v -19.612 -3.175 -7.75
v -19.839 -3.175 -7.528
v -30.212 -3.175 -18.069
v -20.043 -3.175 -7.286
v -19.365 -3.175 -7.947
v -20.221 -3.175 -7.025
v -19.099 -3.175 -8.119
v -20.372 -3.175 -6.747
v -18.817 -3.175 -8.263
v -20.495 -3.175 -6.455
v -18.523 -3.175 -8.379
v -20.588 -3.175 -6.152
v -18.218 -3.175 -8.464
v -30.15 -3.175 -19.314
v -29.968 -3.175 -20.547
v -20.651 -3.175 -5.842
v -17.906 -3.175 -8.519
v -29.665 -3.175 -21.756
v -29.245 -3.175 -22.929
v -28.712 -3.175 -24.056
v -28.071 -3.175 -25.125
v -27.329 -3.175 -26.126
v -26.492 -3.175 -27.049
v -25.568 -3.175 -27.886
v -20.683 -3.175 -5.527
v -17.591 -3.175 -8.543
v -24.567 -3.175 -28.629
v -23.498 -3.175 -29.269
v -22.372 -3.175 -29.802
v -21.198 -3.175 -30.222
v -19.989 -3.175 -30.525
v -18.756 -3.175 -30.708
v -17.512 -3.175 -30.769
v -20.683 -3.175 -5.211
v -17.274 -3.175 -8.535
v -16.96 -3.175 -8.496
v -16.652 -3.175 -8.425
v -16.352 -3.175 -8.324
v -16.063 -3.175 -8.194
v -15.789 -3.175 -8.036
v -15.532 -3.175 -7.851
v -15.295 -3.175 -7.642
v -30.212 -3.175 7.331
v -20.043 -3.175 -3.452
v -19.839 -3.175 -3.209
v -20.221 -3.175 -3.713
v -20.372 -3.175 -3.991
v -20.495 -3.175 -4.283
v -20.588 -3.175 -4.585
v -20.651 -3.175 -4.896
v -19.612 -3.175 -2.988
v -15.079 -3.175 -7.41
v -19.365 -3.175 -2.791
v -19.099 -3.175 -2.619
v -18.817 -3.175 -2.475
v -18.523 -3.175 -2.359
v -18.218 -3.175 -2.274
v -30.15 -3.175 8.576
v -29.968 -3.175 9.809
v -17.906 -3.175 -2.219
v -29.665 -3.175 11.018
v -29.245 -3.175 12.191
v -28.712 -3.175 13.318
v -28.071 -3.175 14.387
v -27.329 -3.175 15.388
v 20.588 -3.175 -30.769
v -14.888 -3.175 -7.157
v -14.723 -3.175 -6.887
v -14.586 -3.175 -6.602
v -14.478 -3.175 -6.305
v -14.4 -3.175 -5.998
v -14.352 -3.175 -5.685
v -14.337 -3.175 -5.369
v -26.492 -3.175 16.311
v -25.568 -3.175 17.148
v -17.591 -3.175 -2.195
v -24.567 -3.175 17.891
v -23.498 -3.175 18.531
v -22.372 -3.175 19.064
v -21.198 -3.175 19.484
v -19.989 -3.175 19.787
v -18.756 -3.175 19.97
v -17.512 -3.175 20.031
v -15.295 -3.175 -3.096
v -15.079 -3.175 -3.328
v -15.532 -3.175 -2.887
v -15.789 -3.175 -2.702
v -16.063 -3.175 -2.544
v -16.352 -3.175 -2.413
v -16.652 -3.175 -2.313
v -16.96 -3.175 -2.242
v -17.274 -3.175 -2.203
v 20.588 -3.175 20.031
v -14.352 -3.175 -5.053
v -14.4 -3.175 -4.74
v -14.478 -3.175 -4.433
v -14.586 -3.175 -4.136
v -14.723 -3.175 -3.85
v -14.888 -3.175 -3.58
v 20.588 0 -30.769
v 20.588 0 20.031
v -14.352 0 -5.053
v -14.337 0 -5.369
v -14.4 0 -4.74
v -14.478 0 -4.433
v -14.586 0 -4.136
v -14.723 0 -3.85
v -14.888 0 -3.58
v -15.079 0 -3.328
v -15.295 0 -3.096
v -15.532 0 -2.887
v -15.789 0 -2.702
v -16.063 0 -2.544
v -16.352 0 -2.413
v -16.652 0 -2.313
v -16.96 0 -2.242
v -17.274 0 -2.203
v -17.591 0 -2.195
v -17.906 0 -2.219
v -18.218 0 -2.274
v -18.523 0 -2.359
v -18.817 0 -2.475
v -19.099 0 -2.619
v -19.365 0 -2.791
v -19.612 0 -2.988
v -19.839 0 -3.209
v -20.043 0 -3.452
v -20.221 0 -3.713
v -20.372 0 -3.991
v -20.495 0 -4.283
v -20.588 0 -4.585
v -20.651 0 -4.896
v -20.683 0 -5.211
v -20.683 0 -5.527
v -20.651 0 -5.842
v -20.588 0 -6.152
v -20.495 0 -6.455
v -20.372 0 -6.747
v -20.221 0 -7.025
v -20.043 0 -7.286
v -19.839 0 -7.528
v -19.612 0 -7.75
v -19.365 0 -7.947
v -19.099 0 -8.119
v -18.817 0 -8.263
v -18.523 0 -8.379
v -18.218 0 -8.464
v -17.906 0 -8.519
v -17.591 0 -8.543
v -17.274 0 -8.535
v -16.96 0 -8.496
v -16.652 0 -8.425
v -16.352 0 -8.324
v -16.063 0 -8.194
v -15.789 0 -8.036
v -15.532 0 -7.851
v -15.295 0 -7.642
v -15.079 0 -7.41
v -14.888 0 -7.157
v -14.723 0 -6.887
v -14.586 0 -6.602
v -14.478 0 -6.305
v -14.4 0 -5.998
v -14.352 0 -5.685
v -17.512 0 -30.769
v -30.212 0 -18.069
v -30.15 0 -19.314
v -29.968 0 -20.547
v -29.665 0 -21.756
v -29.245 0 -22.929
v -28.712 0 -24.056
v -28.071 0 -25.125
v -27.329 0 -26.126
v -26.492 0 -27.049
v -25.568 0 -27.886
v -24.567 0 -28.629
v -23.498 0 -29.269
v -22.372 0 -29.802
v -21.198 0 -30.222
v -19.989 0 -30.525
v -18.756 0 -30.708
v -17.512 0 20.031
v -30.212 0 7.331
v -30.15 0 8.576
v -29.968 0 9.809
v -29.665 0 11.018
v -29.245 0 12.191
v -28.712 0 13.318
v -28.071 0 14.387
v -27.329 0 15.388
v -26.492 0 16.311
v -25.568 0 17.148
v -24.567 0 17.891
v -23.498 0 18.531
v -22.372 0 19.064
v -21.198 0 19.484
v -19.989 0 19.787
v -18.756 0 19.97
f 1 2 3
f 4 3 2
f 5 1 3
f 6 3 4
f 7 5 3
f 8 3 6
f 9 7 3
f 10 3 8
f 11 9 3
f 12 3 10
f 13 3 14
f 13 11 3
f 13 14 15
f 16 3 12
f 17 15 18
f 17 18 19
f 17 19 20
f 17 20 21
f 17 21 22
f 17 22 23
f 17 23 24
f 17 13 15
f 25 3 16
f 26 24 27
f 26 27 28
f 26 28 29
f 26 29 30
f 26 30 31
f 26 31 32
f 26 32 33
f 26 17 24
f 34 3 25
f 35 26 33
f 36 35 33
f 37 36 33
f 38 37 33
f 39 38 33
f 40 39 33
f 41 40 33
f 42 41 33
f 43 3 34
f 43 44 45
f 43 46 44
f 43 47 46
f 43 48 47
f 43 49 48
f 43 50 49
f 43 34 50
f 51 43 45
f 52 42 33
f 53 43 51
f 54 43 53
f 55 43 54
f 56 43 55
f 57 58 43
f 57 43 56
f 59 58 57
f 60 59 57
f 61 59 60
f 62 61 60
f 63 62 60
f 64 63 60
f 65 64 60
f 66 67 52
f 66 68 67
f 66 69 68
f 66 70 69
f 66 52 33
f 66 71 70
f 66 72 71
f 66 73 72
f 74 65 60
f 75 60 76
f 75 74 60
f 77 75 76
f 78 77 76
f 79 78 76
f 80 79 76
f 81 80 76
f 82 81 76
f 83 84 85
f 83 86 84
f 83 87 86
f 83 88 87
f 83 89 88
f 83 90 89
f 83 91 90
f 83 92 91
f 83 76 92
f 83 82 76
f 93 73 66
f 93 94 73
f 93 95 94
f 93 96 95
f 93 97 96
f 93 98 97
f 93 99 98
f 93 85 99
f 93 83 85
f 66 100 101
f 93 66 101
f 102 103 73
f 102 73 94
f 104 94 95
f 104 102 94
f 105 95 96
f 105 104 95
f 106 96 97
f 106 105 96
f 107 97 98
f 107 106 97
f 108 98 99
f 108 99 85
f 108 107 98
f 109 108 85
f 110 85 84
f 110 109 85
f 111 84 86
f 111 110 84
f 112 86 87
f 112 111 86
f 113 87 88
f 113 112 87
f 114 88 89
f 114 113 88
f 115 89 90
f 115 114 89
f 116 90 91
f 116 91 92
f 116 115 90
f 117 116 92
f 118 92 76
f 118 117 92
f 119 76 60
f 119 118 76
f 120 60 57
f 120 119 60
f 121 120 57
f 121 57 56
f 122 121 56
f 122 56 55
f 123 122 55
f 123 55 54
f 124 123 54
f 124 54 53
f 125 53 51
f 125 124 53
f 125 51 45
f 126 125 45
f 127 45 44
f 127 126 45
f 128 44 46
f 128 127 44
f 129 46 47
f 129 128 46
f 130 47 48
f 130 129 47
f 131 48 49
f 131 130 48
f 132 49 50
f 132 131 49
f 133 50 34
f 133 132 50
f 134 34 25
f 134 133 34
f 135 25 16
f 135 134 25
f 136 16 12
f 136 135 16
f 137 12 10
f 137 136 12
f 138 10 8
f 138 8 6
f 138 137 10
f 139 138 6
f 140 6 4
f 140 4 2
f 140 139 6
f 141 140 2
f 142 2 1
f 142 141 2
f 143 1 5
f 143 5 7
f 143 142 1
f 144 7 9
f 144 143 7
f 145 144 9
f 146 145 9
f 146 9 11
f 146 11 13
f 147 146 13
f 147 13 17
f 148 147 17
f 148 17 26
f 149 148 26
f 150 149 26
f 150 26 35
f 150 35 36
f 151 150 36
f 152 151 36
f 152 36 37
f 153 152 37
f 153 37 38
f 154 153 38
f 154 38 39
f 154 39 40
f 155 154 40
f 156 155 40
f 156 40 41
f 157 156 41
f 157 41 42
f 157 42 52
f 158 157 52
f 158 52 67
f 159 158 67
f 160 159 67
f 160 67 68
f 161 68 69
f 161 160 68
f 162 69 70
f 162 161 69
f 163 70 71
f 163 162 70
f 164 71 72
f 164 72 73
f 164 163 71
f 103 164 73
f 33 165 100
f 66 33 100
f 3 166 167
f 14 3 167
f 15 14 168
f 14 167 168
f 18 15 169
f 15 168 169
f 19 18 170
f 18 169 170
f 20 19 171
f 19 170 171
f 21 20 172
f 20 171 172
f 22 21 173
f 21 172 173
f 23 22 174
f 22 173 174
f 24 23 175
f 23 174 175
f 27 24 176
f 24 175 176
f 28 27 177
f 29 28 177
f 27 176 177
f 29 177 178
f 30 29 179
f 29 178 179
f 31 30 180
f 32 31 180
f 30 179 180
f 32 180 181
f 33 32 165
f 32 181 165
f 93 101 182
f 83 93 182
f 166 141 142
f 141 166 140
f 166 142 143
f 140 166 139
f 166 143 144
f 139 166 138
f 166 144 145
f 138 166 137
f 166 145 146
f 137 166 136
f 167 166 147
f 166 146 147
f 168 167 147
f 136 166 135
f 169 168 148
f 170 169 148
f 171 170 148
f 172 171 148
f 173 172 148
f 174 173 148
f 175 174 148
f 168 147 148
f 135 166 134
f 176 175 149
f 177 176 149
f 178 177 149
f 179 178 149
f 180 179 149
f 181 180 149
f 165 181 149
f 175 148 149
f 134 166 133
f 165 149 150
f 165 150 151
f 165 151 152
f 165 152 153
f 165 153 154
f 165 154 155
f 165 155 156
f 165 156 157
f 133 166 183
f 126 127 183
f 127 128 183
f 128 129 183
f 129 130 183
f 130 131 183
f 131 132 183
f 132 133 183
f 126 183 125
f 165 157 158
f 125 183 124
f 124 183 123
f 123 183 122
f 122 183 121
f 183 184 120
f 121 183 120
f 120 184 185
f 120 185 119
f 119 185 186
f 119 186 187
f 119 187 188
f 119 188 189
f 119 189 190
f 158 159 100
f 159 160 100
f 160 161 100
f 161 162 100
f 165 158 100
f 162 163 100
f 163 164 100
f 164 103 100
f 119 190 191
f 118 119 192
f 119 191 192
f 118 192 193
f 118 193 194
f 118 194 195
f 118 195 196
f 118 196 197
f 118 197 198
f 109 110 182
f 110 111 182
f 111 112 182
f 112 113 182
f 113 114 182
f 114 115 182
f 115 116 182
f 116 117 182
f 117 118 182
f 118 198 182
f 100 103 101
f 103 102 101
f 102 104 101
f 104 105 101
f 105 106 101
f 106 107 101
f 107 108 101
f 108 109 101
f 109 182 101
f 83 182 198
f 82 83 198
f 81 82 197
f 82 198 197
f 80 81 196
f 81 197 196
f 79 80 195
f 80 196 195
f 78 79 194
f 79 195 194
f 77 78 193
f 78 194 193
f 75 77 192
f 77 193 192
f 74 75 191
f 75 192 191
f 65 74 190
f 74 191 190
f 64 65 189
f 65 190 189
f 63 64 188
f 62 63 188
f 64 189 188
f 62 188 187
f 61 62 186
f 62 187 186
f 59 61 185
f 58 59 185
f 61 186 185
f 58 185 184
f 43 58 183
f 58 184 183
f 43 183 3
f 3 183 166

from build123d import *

# Parameters (mm, degrees)
F0_R     = 3.175
F1_DEPTH = 3.175


with BuildPart() as f1:
    # F0 (on Front) → F1 (new body)
    with BuildSketch(Plane.XZ):
        with BuildLine():
            Line((20.588394, 20.031052), (-17.511606, 20.031052))
            ThreePointArc((-17.511606, 20.031052), (-26.491862, 16.311308), (-30.211606, 7.331052))
            Line((-30.211606, 7.331052), (-30.211606, -18.068948))
            ThreePointArc((-30.211606, -18.068948), (-26.491862, -27.049204), (-17.511606, -30.768948))
            Line((-17.511606, -30.768948), (20.588394, -30.768948))
            Line((20.588394, -30.768948), (20.588394, 20.031052))
        make_face()
        with Locations((-17.511606, -5.368948)):
            Circle(F0_R, mode=Mode.SUBTRACT)
    extrude(amount=F1_DEPTH)


solid = f1.part
